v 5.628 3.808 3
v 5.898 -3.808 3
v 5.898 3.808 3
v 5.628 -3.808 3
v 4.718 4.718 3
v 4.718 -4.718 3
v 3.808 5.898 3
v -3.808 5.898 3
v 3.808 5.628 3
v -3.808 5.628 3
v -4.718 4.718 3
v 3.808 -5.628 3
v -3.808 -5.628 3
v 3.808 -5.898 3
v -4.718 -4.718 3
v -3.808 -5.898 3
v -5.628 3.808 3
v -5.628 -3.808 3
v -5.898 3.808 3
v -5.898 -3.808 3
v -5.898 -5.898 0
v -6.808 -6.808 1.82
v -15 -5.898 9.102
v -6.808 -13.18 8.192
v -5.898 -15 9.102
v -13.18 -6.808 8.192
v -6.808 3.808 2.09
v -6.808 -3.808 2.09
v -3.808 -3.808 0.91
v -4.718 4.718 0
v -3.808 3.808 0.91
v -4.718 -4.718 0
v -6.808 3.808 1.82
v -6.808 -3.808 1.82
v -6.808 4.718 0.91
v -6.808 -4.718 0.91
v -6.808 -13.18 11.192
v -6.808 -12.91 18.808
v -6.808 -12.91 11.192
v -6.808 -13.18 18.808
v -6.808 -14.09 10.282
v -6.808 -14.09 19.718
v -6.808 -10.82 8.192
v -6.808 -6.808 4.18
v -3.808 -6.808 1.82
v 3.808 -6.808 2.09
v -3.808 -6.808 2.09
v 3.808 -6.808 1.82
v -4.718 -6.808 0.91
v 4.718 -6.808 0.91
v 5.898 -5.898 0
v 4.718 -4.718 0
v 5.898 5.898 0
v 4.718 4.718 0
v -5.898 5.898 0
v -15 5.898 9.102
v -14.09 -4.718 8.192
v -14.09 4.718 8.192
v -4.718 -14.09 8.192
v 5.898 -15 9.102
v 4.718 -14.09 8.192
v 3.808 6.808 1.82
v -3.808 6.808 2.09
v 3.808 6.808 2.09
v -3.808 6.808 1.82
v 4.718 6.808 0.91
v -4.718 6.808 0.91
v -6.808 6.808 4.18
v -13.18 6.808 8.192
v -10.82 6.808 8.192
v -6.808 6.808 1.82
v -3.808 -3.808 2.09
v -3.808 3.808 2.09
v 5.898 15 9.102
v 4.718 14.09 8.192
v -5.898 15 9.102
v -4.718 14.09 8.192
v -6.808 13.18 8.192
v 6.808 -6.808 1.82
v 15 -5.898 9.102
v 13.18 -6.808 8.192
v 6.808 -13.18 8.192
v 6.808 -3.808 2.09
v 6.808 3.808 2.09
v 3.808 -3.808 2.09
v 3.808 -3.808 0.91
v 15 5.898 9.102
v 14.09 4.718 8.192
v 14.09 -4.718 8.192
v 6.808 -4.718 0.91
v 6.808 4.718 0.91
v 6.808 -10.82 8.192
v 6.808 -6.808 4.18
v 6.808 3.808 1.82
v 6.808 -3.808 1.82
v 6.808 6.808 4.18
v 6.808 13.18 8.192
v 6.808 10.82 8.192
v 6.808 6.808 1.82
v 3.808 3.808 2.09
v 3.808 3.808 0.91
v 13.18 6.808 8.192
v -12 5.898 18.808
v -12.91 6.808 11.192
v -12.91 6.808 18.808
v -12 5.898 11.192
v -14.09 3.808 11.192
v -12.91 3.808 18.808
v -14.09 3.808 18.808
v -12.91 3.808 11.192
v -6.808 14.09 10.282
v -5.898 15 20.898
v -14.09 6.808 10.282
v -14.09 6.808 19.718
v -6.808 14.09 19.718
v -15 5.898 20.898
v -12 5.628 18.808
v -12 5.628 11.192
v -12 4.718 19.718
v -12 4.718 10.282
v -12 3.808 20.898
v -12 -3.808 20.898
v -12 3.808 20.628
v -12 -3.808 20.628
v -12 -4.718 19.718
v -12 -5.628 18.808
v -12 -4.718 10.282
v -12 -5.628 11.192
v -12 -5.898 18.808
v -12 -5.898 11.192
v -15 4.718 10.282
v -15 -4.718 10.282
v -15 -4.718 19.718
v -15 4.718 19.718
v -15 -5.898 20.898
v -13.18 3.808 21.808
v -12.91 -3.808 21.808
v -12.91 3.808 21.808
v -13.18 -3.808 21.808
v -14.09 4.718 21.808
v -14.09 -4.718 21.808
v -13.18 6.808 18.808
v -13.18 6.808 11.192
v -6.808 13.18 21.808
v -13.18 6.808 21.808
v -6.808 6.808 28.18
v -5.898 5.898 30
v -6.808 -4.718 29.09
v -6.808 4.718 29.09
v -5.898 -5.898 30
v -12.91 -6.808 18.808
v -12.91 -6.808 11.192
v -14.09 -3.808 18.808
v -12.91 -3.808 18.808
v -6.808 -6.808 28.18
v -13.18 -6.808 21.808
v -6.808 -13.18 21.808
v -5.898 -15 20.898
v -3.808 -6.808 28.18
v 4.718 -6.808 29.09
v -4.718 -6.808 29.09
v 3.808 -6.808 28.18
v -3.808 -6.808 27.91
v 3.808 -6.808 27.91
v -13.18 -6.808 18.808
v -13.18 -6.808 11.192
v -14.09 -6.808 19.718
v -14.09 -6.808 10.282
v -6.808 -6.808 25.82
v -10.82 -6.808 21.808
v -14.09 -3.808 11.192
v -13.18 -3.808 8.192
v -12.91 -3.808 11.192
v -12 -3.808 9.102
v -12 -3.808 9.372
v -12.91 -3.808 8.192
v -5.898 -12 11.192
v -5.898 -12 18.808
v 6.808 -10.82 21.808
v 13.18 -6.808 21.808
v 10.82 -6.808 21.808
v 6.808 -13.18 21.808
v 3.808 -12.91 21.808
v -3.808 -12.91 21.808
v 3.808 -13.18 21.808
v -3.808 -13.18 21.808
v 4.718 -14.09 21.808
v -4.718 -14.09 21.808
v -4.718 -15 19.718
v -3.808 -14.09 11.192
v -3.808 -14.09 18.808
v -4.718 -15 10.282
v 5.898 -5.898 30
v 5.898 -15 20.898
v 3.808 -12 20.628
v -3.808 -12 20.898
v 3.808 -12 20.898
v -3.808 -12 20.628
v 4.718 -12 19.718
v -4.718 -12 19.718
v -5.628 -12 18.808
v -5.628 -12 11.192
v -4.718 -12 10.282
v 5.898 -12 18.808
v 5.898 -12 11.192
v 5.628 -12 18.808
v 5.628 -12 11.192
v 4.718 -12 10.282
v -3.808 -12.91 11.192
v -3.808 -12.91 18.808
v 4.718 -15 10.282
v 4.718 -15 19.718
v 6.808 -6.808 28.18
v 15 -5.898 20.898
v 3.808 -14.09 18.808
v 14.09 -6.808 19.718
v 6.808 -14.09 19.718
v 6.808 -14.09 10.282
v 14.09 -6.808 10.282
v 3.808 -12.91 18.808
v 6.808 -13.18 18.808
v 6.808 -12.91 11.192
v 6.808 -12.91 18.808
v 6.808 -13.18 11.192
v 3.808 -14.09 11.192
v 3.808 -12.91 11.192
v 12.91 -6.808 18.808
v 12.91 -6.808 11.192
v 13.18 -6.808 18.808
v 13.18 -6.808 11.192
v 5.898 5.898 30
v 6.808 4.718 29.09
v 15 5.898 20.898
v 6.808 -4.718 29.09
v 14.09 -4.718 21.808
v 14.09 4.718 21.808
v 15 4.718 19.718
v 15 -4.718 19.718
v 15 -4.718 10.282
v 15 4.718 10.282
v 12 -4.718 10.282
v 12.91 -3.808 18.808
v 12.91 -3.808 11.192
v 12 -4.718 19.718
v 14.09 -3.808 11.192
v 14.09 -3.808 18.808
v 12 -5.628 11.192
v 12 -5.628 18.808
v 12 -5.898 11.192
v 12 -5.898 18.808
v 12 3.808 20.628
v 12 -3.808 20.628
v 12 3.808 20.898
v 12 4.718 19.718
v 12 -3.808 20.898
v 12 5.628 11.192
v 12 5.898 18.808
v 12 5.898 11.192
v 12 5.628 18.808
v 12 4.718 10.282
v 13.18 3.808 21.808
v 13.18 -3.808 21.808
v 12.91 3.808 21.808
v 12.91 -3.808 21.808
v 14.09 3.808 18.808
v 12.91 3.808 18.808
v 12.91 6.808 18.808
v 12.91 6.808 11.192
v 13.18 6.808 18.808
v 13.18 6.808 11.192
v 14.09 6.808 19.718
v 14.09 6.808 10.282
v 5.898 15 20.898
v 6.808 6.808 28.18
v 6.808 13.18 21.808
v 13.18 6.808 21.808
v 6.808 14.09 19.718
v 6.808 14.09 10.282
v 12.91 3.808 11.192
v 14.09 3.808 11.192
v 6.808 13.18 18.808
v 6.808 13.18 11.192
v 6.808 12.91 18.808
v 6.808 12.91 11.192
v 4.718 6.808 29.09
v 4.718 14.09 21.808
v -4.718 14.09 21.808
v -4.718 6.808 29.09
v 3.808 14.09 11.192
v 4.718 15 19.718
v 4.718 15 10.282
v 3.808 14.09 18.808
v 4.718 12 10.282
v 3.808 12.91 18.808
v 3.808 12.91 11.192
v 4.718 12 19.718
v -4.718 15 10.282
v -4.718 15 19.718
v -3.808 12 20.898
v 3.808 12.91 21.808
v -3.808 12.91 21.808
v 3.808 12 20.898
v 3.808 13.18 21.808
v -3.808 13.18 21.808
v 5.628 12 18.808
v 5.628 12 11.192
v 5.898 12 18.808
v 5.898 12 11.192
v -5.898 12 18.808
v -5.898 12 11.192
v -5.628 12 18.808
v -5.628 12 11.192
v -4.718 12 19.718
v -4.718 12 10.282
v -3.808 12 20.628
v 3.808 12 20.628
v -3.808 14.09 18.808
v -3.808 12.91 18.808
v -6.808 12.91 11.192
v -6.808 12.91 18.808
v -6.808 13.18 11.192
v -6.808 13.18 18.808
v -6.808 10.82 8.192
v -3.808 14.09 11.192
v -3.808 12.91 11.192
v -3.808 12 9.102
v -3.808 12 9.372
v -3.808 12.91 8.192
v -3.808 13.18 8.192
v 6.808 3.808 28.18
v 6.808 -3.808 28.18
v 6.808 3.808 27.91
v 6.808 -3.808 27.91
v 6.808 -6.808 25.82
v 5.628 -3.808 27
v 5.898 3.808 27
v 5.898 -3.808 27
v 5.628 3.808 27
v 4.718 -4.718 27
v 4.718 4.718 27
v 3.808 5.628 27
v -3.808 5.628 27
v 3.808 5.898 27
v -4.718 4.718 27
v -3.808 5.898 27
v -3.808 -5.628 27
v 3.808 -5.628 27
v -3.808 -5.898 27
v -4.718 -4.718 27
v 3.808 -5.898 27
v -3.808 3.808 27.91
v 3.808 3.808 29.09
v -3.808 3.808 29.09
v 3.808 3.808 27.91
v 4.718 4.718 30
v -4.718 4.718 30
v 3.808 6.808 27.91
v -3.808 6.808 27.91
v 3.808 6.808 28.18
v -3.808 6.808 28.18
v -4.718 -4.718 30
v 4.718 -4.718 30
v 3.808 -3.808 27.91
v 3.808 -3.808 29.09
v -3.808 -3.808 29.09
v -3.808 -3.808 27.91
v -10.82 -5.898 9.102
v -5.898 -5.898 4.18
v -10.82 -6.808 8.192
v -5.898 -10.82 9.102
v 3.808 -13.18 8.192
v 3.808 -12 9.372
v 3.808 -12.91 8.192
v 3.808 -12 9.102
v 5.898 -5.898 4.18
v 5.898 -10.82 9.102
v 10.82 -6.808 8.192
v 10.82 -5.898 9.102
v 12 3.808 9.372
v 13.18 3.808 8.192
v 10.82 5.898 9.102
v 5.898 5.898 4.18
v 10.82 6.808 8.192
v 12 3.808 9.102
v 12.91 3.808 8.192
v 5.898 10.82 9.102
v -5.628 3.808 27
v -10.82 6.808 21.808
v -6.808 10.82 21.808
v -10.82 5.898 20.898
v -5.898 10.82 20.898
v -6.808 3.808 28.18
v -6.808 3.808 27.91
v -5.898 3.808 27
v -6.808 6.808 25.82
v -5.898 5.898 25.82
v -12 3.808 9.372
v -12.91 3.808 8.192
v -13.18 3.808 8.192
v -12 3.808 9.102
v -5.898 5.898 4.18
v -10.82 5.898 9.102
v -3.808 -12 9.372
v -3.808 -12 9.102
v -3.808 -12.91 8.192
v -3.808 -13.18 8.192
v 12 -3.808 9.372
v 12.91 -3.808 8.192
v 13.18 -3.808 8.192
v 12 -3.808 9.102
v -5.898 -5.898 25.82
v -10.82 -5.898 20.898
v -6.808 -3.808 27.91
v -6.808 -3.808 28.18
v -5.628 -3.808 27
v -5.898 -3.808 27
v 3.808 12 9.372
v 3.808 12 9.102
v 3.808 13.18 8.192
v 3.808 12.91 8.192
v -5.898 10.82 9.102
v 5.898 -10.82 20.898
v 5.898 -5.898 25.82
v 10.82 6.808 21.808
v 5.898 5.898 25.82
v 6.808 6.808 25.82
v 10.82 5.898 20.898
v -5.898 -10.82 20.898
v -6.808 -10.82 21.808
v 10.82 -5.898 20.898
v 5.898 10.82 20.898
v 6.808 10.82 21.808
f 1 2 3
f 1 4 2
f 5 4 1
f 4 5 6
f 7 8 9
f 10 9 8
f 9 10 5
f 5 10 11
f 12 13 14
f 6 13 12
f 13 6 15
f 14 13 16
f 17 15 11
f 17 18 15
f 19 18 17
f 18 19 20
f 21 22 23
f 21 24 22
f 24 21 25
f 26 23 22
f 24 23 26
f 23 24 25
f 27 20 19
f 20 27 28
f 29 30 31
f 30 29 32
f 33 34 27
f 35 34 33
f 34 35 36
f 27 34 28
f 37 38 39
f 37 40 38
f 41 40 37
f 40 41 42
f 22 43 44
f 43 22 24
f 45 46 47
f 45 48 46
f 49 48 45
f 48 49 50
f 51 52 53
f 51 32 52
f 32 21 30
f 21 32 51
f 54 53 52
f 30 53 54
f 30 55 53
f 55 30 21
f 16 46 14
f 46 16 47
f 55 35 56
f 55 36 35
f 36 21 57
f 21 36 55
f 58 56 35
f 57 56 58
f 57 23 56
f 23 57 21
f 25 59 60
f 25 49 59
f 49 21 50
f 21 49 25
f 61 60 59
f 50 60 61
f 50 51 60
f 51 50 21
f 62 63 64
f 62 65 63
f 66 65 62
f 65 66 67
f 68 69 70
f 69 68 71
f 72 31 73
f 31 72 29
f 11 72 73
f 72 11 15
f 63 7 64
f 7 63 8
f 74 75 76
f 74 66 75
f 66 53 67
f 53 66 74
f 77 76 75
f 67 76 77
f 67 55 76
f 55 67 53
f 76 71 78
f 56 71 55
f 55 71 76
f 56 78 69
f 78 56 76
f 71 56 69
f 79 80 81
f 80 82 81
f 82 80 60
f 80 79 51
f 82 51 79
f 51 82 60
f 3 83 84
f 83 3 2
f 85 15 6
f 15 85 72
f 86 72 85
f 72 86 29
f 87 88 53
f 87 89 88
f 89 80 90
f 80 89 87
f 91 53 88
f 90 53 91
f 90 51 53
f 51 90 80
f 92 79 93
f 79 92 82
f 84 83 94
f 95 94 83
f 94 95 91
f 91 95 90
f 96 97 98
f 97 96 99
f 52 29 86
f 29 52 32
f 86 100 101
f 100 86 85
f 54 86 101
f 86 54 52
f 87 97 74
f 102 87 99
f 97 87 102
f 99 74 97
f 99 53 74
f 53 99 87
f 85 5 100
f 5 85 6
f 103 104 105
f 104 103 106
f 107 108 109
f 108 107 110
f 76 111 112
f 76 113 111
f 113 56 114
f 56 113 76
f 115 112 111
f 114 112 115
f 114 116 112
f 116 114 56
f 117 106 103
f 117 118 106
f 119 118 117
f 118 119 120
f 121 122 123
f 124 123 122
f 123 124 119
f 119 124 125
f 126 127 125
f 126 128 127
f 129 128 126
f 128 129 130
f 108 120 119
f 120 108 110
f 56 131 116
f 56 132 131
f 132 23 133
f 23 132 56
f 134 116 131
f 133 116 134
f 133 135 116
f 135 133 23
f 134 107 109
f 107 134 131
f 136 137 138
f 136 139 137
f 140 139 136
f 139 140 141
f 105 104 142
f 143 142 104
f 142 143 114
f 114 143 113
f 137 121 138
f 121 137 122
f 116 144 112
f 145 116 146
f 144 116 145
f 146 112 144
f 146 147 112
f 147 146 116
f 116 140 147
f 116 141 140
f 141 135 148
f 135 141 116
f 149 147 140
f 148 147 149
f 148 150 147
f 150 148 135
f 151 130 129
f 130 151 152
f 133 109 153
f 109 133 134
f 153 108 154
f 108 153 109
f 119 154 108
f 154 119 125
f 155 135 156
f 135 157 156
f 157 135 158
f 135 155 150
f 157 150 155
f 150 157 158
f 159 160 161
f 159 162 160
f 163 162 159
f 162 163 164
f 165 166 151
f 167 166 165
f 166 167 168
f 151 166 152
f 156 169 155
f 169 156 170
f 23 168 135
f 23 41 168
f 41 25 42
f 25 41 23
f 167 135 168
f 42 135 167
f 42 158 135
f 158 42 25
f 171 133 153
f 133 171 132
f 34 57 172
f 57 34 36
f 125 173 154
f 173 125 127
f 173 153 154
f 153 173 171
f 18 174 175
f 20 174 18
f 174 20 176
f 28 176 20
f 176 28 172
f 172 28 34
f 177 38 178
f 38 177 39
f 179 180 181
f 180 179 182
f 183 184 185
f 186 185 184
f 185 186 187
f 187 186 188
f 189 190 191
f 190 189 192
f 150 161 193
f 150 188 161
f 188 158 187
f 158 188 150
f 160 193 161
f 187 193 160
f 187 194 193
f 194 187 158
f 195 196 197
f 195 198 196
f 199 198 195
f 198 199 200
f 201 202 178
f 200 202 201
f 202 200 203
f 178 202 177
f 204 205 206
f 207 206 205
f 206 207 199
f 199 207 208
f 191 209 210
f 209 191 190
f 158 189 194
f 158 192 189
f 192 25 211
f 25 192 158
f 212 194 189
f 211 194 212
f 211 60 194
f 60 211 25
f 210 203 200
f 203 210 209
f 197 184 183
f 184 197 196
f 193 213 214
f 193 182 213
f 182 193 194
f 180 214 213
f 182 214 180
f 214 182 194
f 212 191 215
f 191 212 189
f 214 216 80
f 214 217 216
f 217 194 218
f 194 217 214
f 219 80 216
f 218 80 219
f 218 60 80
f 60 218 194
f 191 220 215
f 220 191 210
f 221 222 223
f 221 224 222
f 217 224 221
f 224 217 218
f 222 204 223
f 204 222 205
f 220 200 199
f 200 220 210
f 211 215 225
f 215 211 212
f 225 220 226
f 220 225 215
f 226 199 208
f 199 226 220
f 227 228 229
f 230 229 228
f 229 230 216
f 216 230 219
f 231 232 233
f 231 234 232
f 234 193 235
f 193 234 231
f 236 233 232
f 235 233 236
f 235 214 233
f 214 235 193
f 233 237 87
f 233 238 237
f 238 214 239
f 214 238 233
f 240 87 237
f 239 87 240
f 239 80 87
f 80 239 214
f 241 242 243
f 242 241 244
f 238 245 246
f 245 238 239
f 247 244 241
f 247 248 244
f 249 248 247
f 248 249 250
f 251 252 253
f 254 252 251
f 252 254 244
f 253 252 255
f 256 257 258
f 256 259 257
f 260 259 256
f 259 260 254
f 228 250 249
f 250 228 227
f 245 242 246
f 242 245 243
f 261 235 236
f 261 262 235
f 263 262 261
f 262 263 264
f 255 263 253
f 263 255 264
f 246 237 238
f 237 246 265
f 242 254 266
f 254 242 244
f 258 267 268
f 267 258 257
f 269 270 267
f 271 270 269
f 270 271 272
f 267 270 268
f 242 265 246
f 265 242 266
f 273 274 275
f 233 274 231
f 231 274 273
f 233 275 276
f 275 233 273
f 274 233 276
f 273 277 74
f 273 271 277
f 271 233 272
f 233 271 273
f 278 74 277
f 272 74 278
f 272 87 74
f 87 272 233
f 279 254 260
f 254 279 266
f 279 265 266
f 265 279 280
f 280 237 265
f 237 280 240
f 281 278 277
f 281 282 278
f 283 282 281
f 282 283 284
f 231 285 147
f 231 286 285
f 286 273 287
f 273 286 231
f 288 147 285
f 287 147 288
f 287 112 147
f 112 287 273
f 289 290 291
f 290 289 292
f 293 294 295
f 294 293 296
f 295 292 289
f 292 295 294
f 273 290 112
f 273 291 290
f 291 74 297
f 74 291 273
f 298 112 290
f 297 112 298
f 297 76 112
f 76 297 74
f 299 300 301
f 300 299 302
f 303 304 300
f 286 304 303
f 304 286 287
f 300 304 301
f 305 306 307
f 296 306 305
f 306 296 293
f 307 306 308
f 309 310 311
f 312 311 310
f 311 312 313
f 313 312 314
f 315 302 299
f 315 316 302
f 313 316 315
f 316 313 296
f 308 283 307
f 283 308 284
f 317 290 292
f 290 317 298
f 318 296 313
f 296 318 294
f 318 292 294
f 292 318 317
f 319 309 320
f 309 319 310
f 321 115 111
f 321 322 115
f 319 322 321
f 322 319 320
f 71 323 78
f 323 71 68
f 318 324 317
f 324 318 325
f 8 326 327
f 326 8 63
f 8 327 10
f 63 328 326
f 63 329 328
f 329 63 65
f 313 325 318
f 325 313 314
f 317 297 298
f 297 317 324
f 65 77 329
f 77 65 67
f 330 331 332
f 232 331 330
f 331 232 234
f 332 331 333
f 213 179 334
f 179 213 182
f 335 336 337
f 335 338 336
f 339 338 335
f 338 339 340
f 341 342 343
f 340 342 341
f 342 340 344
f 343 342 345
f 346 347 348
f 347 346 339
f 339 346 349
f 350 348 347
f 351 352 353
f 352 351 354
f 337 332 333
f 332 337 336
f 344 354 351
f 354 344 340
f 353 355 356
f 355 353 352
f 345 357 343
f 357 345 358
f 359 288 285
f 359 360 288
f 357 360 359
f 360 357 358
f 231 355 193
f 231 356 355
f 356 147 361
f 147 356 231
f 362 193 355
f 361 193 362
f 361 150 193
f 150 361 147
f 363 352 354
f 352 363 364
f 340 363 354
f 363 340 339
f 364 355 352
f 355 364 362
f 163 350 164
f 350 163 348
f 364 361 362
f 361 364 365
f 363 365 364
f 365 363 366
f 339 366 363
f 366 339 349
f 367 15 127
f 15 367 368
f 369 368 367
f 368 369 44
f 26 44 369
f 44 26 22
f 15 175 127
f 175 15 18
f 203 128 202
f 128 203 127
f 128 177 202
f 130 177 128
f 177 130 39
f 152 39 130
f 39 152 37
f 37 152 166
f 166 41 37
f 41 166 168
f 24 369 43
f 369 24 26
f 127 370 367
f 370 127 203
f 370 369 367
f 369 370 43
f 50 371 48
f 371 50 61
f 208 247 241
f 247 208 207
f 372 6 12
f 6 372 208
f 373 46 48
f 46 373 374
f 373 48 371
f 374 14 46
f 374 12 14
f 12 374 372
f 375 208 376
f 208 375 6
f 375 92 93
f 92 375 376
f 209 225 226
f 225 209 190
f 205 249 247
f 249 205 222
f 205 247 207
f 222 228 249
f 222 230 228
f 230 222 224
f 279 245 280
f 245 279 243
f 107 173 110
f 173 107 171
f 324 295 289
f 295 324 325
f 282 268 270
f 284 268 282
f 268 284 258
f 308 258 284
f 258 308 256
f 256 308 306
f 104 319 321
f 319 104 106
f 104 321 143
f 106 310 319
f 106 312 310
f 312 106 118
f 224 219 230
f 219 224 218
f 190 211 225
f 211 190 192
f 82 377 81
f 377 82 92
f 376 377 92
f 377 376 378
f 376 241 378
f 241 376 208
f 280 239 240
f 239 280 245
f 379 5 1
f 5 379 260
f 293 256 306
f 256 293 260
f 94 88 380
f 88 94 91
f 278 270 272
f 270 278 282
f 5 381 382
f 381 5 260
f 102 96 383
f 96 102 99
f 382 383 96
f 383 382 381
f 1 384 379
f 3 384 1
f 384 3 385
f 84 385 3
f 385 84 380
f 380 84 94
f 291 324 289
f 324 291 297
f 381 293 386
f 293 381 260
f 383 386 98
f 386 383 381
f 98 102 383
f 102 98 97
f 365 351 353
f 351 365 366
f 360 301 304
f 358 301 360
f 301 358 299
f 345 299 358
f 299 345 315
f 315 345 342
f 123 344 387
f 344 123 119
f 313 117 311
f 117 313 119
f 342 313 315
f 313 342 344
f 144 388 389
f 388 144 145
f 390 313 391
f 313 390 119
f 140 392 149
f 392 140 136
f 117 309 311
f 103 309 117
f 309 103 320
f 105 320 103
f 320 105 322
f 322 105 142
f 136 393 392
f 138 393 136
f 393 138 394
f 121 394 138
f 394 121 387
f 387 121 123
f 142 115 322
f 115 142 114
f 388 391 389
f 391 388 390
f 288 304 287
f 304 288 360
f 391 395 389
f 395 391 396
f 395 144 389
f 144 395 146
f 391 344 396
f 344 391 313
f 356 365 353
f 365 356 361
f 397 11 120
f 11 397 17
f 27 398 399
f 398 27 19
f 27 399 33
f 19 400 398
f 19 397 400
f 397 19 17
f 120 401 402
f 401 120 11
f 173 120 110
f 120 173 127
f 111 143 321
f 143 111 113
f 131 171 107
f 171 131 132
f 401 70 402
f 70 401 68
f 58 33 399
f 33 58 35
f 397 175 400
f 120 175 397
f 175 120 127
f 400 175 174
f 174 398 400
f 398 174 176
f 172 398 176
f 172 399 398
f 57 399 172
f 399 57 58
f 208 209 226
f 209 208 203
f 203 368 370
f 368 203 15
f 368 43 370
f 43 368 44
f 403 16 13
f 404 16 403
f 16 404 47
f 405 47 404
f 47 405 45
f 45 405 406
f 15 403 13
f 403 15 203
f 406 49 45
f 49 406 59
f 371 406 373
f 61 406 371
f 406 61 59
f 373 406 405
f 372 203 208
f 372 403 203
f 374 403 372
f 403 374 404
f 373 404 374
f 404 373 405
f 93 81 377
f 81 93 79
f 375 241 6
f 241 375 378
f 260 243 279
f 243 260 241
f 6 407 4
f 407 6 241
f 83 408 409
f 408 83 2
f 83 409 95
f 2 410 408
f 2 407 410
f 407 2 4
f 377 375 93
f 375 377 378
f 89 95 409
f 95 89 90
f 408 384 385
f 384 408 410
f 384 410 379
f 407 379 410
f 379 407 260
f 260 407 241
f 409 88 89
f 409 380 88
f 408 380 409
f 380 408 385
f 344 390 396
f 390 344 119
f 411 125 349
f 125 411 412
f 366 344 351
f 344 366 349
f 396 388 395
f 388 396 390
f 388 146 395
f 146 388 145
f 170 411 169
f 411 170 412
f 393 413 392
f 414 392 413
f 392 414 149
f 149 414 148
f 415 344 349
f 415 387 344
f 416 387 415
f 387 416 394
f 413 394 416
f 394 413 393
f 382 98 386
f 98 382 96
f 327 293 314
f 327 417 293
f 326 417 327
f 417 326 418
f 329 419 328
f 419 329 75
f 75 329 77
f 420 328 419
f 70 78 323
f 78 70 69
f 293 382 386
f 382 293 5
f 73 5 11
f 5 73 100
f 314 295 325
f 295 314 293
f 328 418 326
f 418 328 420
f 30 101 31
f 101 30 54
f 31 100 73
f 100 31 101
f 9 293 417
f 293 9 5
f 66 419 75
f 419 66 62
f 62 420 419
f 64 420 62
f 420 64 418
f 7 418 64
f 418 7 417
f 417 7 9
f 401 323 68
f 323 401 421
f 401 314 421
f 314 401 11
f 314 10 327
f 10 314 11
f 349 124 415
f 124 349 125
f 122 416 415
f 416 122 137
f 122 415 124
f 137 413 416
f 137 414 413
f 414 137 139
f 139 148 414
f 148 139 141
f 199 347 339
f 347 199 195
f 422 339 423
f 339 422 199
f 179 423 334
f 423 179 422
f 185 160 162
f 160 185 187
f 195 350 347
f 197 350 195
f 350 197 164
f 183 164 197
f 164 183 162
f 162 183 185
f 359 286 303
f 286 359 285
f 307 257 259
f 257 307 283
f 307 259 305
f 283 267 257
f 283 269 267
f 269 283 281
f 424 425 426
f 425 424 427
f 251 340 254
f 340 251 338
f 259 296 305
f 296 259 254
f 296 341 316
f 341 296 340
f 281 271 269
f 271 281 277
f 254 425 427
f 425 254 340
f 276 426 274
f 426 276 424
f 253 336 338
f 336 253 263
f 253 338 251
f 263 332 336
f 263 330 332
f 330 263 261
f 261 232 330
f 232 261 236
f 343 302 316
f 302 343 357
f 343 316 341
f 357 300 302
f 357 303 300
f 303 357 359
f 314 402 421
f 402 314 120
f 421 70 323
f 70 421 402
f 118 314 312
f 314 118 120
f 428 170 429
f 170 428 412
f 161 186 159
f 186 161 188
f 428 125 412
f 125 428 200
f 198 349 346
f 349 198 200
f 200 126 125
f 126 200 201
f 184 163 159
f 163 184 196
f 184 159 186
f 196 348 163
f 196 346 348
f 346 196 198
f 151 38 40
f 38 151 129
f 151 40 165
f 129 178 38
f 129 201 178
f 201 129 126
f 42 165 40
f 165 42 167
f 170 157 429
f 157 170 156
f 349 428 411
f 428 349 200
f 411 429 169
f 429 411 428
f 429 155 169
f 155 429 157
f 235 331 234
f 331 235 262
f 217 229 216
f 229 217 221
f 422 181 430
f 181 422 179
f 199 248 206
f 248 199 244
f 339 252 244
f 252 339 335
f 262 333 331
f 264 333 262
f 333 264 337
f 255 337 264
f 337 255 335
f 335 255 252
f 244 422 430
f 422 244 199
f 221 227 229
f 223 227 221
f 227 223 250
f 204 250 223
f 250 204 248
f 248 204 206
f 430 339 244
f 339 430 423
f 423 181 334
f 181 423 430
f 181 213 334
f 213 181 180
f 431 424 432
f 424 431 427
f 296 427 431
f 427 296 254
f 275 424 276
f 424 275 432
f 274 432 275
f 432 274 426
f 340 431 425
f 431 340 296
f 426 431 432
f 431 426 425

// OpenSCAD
// shape height
sh = 30;
// border width
bw = 3;

include <polyhedra.scad>;

poly_wire(rhombicuboctahedron);
